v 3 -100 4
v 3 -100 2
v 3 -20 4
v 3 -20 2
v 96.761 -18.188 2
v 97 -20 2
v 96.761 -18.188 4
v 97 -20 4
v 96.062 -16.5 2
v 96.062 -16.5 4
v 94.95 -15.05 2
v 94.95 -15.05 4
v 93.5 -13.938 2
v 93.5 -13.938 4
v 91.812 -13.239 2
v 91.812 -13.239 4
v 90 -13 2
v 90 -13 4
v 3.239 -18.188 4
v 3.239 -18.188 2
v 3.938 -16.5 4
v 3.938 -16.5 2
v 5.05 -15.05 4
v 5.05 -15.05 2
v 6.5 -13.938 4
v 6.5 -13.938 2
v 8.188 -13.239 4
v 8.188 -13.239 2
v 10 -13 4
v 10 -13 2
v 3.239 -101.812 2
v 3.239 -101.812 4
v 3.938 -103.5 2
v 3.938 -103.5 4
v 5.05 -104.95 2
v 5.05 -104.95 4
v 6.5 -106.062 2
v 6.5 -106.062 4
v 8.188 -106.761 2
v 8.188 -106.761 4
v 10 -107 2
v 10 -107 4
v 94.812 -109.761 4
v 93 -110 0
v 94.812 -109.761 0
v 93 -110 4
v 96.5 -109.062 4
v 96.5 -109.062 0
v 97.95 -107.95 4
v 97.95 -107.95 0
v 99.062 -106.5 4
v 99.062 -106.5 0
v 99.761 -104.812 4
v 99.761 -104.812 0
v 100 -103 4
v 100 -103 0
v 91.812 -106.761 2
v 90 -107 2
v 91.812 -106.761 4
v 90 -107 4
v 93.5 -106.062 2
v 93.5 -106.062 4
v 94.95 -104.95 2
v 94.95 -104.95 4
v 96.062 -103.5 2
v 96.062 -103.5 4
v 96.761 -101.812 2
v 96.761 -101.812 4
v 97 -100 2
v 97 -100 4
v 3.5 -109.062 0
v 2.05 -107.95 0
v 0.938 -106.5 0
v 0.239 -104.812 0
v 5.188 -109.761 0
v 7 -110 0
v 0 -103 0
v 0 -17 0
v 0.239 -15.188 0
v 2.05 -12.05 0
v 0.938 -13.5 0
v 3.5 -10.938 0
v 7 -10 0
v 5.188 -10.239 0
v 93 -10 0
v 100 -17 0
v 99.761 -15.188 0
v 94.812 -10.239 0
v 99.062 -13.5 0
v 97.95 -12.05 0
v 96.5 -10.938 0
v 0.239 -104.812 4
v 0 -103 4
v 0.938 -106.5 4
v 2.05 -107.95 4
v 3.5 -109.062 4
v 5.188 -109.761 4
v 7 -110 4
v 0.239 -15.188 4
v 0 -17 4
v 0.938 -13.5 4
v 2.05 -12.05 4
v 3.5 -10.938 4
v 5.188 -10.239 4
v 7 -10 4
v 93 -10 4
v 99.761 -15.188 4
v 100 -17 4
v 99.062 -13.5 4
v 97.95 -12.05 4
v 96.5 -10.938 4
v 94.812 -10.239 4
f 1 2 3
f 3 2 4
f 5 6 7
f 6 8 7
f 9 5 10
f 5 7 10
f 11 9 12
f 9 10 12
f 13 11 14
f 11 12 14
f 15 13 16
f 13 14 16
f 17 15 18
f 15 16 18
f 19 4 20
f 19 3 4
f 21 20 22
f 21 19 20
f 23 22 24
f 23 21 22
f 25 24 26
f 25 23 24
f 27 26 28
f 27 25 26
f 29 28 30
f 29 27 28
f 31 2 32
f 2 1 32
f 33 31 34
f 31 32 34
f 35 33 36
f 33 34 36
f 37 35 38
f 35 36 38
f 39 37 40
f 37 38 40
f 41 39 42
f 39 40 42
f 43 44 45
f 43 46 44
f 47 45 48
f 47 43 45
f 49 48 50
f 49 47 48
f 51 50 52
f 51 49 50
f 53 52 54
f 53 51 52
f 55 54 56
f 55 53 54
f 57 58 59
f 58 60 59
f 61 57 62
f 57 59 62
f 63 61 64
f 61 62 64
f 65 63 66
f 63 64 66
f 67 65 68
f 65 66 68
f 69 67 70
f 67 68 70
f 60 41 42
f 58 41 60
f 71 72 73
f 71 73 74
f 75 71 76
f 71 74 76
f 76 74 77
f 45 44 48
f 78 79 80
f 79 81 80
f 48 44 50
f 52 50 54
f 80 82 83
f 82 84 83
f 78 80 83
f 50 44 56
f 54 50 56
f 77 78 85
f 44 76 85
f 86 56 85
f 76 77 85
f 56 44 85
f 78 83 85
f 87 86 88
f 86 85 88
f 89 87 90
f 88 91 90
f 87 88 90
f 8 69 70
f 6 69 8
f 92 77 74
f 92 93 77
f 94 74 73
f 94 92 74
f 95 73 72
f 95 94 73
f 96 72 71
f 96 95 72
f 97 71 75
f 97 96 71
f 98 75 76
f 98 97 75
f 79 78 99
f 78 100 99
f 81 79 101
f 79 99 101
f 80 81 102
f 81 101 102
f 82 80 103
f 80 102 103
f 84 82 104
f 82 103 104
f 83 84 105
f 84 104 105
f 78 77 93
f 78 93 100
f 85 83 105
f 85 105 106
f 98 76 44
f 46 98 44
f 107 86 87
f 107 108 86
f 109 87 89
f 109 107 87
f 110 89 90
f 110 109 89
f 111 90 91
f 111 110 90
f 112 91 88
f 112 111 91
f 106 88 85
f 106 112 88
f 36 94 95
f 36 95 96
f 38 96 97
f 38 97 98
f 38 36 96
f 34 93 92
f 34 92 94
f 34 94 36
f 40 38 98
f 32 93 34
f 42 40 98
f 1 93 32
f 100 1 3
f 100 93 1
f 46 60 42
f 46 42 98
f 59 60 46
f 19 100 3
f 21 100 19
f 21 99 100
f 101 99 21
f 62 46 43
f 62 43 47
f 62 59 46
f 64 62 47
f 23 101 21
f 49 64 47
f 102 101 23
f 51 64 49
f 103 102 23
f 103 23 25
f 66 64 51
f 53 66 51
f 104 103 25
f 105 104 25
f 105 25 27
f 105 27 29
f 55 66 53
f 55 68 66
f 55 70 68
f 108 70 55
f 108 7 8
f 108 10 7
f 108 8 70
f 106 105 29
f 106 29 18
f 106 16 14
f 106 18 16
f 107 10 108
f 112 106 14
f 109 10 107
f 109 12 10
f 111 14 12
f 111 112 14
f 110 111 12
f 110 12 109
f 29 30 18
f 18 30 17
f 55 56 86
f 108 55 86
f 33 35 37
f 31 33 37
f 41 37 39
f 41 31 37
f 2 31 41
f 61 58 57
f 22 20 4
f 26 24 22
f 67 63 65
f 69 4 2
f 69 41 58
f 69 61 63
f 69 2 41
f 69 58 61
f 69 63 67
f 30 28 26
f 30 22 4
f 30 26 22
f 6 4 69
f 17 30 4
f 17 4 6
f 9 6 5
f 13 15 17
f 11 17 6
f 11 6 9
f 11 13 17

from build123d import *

# Parameters (mm, degrees)
BOX012_W     = 94
BOX012_H     = 94
BOX012_DEPTH = 2
FILLET013_R  = 7
BOX011_W     = 100
BOX011_H     = 100
BOX011_DEPTH = 4
FILLET012_R  = 7


with BuildPart() as top_with_fillets005:
    # Box012 → Box012 (new body)
    with BuildSketch(Plane(origin=(3, 3, 2), x_dir=(1, 0, 0), z_dir=(0, 0, 1))):
        with Locations((47, 47)):
            Rectangle(BOX012_W, BOX012_H)
    extrude(amount=BOX012_DEPTH)

    # Fillet013
    fillet013_edges = [top_with_fillets005.edges().sort_by_distance(p)[0] for p in [
        (3, 3, 3),
        (3, 97, 3),
        (97, 3, 3),
        (97, 97, 3),
    ]]
    fillet(fillet013_edges, radius=FILLET013_R)


with BuildPart() as lid:
    # Box011 → Box011 (new body)
    with BuildSketch(Plane.XY):
        with Locations((50, 50)):
            Rectangle(BOX011_W, BOX011_H)
    extrude(amount=BOX011_DEPTH)

    # Fillet012
    fillet012_edges = [lid.edges().sort_by_distance(p)[0] for p in [
        (0, 0, 2),
        (0, 100, 2),
        (100, 0, 2),
        (100, 100, 2),
    ]]
    fillet(fillet012_edges, radius=FILLET012_R)

    # Cut004: cut Top with fillets005
    add(top_with_fillets005.part, mode=Mode.SUBTRACT)


with BuildPart() as lid_1:
    # Cut004 placement: moved
    add(lid.part.moved(Location((0, -110, 0))))


solid = lid_1.part
